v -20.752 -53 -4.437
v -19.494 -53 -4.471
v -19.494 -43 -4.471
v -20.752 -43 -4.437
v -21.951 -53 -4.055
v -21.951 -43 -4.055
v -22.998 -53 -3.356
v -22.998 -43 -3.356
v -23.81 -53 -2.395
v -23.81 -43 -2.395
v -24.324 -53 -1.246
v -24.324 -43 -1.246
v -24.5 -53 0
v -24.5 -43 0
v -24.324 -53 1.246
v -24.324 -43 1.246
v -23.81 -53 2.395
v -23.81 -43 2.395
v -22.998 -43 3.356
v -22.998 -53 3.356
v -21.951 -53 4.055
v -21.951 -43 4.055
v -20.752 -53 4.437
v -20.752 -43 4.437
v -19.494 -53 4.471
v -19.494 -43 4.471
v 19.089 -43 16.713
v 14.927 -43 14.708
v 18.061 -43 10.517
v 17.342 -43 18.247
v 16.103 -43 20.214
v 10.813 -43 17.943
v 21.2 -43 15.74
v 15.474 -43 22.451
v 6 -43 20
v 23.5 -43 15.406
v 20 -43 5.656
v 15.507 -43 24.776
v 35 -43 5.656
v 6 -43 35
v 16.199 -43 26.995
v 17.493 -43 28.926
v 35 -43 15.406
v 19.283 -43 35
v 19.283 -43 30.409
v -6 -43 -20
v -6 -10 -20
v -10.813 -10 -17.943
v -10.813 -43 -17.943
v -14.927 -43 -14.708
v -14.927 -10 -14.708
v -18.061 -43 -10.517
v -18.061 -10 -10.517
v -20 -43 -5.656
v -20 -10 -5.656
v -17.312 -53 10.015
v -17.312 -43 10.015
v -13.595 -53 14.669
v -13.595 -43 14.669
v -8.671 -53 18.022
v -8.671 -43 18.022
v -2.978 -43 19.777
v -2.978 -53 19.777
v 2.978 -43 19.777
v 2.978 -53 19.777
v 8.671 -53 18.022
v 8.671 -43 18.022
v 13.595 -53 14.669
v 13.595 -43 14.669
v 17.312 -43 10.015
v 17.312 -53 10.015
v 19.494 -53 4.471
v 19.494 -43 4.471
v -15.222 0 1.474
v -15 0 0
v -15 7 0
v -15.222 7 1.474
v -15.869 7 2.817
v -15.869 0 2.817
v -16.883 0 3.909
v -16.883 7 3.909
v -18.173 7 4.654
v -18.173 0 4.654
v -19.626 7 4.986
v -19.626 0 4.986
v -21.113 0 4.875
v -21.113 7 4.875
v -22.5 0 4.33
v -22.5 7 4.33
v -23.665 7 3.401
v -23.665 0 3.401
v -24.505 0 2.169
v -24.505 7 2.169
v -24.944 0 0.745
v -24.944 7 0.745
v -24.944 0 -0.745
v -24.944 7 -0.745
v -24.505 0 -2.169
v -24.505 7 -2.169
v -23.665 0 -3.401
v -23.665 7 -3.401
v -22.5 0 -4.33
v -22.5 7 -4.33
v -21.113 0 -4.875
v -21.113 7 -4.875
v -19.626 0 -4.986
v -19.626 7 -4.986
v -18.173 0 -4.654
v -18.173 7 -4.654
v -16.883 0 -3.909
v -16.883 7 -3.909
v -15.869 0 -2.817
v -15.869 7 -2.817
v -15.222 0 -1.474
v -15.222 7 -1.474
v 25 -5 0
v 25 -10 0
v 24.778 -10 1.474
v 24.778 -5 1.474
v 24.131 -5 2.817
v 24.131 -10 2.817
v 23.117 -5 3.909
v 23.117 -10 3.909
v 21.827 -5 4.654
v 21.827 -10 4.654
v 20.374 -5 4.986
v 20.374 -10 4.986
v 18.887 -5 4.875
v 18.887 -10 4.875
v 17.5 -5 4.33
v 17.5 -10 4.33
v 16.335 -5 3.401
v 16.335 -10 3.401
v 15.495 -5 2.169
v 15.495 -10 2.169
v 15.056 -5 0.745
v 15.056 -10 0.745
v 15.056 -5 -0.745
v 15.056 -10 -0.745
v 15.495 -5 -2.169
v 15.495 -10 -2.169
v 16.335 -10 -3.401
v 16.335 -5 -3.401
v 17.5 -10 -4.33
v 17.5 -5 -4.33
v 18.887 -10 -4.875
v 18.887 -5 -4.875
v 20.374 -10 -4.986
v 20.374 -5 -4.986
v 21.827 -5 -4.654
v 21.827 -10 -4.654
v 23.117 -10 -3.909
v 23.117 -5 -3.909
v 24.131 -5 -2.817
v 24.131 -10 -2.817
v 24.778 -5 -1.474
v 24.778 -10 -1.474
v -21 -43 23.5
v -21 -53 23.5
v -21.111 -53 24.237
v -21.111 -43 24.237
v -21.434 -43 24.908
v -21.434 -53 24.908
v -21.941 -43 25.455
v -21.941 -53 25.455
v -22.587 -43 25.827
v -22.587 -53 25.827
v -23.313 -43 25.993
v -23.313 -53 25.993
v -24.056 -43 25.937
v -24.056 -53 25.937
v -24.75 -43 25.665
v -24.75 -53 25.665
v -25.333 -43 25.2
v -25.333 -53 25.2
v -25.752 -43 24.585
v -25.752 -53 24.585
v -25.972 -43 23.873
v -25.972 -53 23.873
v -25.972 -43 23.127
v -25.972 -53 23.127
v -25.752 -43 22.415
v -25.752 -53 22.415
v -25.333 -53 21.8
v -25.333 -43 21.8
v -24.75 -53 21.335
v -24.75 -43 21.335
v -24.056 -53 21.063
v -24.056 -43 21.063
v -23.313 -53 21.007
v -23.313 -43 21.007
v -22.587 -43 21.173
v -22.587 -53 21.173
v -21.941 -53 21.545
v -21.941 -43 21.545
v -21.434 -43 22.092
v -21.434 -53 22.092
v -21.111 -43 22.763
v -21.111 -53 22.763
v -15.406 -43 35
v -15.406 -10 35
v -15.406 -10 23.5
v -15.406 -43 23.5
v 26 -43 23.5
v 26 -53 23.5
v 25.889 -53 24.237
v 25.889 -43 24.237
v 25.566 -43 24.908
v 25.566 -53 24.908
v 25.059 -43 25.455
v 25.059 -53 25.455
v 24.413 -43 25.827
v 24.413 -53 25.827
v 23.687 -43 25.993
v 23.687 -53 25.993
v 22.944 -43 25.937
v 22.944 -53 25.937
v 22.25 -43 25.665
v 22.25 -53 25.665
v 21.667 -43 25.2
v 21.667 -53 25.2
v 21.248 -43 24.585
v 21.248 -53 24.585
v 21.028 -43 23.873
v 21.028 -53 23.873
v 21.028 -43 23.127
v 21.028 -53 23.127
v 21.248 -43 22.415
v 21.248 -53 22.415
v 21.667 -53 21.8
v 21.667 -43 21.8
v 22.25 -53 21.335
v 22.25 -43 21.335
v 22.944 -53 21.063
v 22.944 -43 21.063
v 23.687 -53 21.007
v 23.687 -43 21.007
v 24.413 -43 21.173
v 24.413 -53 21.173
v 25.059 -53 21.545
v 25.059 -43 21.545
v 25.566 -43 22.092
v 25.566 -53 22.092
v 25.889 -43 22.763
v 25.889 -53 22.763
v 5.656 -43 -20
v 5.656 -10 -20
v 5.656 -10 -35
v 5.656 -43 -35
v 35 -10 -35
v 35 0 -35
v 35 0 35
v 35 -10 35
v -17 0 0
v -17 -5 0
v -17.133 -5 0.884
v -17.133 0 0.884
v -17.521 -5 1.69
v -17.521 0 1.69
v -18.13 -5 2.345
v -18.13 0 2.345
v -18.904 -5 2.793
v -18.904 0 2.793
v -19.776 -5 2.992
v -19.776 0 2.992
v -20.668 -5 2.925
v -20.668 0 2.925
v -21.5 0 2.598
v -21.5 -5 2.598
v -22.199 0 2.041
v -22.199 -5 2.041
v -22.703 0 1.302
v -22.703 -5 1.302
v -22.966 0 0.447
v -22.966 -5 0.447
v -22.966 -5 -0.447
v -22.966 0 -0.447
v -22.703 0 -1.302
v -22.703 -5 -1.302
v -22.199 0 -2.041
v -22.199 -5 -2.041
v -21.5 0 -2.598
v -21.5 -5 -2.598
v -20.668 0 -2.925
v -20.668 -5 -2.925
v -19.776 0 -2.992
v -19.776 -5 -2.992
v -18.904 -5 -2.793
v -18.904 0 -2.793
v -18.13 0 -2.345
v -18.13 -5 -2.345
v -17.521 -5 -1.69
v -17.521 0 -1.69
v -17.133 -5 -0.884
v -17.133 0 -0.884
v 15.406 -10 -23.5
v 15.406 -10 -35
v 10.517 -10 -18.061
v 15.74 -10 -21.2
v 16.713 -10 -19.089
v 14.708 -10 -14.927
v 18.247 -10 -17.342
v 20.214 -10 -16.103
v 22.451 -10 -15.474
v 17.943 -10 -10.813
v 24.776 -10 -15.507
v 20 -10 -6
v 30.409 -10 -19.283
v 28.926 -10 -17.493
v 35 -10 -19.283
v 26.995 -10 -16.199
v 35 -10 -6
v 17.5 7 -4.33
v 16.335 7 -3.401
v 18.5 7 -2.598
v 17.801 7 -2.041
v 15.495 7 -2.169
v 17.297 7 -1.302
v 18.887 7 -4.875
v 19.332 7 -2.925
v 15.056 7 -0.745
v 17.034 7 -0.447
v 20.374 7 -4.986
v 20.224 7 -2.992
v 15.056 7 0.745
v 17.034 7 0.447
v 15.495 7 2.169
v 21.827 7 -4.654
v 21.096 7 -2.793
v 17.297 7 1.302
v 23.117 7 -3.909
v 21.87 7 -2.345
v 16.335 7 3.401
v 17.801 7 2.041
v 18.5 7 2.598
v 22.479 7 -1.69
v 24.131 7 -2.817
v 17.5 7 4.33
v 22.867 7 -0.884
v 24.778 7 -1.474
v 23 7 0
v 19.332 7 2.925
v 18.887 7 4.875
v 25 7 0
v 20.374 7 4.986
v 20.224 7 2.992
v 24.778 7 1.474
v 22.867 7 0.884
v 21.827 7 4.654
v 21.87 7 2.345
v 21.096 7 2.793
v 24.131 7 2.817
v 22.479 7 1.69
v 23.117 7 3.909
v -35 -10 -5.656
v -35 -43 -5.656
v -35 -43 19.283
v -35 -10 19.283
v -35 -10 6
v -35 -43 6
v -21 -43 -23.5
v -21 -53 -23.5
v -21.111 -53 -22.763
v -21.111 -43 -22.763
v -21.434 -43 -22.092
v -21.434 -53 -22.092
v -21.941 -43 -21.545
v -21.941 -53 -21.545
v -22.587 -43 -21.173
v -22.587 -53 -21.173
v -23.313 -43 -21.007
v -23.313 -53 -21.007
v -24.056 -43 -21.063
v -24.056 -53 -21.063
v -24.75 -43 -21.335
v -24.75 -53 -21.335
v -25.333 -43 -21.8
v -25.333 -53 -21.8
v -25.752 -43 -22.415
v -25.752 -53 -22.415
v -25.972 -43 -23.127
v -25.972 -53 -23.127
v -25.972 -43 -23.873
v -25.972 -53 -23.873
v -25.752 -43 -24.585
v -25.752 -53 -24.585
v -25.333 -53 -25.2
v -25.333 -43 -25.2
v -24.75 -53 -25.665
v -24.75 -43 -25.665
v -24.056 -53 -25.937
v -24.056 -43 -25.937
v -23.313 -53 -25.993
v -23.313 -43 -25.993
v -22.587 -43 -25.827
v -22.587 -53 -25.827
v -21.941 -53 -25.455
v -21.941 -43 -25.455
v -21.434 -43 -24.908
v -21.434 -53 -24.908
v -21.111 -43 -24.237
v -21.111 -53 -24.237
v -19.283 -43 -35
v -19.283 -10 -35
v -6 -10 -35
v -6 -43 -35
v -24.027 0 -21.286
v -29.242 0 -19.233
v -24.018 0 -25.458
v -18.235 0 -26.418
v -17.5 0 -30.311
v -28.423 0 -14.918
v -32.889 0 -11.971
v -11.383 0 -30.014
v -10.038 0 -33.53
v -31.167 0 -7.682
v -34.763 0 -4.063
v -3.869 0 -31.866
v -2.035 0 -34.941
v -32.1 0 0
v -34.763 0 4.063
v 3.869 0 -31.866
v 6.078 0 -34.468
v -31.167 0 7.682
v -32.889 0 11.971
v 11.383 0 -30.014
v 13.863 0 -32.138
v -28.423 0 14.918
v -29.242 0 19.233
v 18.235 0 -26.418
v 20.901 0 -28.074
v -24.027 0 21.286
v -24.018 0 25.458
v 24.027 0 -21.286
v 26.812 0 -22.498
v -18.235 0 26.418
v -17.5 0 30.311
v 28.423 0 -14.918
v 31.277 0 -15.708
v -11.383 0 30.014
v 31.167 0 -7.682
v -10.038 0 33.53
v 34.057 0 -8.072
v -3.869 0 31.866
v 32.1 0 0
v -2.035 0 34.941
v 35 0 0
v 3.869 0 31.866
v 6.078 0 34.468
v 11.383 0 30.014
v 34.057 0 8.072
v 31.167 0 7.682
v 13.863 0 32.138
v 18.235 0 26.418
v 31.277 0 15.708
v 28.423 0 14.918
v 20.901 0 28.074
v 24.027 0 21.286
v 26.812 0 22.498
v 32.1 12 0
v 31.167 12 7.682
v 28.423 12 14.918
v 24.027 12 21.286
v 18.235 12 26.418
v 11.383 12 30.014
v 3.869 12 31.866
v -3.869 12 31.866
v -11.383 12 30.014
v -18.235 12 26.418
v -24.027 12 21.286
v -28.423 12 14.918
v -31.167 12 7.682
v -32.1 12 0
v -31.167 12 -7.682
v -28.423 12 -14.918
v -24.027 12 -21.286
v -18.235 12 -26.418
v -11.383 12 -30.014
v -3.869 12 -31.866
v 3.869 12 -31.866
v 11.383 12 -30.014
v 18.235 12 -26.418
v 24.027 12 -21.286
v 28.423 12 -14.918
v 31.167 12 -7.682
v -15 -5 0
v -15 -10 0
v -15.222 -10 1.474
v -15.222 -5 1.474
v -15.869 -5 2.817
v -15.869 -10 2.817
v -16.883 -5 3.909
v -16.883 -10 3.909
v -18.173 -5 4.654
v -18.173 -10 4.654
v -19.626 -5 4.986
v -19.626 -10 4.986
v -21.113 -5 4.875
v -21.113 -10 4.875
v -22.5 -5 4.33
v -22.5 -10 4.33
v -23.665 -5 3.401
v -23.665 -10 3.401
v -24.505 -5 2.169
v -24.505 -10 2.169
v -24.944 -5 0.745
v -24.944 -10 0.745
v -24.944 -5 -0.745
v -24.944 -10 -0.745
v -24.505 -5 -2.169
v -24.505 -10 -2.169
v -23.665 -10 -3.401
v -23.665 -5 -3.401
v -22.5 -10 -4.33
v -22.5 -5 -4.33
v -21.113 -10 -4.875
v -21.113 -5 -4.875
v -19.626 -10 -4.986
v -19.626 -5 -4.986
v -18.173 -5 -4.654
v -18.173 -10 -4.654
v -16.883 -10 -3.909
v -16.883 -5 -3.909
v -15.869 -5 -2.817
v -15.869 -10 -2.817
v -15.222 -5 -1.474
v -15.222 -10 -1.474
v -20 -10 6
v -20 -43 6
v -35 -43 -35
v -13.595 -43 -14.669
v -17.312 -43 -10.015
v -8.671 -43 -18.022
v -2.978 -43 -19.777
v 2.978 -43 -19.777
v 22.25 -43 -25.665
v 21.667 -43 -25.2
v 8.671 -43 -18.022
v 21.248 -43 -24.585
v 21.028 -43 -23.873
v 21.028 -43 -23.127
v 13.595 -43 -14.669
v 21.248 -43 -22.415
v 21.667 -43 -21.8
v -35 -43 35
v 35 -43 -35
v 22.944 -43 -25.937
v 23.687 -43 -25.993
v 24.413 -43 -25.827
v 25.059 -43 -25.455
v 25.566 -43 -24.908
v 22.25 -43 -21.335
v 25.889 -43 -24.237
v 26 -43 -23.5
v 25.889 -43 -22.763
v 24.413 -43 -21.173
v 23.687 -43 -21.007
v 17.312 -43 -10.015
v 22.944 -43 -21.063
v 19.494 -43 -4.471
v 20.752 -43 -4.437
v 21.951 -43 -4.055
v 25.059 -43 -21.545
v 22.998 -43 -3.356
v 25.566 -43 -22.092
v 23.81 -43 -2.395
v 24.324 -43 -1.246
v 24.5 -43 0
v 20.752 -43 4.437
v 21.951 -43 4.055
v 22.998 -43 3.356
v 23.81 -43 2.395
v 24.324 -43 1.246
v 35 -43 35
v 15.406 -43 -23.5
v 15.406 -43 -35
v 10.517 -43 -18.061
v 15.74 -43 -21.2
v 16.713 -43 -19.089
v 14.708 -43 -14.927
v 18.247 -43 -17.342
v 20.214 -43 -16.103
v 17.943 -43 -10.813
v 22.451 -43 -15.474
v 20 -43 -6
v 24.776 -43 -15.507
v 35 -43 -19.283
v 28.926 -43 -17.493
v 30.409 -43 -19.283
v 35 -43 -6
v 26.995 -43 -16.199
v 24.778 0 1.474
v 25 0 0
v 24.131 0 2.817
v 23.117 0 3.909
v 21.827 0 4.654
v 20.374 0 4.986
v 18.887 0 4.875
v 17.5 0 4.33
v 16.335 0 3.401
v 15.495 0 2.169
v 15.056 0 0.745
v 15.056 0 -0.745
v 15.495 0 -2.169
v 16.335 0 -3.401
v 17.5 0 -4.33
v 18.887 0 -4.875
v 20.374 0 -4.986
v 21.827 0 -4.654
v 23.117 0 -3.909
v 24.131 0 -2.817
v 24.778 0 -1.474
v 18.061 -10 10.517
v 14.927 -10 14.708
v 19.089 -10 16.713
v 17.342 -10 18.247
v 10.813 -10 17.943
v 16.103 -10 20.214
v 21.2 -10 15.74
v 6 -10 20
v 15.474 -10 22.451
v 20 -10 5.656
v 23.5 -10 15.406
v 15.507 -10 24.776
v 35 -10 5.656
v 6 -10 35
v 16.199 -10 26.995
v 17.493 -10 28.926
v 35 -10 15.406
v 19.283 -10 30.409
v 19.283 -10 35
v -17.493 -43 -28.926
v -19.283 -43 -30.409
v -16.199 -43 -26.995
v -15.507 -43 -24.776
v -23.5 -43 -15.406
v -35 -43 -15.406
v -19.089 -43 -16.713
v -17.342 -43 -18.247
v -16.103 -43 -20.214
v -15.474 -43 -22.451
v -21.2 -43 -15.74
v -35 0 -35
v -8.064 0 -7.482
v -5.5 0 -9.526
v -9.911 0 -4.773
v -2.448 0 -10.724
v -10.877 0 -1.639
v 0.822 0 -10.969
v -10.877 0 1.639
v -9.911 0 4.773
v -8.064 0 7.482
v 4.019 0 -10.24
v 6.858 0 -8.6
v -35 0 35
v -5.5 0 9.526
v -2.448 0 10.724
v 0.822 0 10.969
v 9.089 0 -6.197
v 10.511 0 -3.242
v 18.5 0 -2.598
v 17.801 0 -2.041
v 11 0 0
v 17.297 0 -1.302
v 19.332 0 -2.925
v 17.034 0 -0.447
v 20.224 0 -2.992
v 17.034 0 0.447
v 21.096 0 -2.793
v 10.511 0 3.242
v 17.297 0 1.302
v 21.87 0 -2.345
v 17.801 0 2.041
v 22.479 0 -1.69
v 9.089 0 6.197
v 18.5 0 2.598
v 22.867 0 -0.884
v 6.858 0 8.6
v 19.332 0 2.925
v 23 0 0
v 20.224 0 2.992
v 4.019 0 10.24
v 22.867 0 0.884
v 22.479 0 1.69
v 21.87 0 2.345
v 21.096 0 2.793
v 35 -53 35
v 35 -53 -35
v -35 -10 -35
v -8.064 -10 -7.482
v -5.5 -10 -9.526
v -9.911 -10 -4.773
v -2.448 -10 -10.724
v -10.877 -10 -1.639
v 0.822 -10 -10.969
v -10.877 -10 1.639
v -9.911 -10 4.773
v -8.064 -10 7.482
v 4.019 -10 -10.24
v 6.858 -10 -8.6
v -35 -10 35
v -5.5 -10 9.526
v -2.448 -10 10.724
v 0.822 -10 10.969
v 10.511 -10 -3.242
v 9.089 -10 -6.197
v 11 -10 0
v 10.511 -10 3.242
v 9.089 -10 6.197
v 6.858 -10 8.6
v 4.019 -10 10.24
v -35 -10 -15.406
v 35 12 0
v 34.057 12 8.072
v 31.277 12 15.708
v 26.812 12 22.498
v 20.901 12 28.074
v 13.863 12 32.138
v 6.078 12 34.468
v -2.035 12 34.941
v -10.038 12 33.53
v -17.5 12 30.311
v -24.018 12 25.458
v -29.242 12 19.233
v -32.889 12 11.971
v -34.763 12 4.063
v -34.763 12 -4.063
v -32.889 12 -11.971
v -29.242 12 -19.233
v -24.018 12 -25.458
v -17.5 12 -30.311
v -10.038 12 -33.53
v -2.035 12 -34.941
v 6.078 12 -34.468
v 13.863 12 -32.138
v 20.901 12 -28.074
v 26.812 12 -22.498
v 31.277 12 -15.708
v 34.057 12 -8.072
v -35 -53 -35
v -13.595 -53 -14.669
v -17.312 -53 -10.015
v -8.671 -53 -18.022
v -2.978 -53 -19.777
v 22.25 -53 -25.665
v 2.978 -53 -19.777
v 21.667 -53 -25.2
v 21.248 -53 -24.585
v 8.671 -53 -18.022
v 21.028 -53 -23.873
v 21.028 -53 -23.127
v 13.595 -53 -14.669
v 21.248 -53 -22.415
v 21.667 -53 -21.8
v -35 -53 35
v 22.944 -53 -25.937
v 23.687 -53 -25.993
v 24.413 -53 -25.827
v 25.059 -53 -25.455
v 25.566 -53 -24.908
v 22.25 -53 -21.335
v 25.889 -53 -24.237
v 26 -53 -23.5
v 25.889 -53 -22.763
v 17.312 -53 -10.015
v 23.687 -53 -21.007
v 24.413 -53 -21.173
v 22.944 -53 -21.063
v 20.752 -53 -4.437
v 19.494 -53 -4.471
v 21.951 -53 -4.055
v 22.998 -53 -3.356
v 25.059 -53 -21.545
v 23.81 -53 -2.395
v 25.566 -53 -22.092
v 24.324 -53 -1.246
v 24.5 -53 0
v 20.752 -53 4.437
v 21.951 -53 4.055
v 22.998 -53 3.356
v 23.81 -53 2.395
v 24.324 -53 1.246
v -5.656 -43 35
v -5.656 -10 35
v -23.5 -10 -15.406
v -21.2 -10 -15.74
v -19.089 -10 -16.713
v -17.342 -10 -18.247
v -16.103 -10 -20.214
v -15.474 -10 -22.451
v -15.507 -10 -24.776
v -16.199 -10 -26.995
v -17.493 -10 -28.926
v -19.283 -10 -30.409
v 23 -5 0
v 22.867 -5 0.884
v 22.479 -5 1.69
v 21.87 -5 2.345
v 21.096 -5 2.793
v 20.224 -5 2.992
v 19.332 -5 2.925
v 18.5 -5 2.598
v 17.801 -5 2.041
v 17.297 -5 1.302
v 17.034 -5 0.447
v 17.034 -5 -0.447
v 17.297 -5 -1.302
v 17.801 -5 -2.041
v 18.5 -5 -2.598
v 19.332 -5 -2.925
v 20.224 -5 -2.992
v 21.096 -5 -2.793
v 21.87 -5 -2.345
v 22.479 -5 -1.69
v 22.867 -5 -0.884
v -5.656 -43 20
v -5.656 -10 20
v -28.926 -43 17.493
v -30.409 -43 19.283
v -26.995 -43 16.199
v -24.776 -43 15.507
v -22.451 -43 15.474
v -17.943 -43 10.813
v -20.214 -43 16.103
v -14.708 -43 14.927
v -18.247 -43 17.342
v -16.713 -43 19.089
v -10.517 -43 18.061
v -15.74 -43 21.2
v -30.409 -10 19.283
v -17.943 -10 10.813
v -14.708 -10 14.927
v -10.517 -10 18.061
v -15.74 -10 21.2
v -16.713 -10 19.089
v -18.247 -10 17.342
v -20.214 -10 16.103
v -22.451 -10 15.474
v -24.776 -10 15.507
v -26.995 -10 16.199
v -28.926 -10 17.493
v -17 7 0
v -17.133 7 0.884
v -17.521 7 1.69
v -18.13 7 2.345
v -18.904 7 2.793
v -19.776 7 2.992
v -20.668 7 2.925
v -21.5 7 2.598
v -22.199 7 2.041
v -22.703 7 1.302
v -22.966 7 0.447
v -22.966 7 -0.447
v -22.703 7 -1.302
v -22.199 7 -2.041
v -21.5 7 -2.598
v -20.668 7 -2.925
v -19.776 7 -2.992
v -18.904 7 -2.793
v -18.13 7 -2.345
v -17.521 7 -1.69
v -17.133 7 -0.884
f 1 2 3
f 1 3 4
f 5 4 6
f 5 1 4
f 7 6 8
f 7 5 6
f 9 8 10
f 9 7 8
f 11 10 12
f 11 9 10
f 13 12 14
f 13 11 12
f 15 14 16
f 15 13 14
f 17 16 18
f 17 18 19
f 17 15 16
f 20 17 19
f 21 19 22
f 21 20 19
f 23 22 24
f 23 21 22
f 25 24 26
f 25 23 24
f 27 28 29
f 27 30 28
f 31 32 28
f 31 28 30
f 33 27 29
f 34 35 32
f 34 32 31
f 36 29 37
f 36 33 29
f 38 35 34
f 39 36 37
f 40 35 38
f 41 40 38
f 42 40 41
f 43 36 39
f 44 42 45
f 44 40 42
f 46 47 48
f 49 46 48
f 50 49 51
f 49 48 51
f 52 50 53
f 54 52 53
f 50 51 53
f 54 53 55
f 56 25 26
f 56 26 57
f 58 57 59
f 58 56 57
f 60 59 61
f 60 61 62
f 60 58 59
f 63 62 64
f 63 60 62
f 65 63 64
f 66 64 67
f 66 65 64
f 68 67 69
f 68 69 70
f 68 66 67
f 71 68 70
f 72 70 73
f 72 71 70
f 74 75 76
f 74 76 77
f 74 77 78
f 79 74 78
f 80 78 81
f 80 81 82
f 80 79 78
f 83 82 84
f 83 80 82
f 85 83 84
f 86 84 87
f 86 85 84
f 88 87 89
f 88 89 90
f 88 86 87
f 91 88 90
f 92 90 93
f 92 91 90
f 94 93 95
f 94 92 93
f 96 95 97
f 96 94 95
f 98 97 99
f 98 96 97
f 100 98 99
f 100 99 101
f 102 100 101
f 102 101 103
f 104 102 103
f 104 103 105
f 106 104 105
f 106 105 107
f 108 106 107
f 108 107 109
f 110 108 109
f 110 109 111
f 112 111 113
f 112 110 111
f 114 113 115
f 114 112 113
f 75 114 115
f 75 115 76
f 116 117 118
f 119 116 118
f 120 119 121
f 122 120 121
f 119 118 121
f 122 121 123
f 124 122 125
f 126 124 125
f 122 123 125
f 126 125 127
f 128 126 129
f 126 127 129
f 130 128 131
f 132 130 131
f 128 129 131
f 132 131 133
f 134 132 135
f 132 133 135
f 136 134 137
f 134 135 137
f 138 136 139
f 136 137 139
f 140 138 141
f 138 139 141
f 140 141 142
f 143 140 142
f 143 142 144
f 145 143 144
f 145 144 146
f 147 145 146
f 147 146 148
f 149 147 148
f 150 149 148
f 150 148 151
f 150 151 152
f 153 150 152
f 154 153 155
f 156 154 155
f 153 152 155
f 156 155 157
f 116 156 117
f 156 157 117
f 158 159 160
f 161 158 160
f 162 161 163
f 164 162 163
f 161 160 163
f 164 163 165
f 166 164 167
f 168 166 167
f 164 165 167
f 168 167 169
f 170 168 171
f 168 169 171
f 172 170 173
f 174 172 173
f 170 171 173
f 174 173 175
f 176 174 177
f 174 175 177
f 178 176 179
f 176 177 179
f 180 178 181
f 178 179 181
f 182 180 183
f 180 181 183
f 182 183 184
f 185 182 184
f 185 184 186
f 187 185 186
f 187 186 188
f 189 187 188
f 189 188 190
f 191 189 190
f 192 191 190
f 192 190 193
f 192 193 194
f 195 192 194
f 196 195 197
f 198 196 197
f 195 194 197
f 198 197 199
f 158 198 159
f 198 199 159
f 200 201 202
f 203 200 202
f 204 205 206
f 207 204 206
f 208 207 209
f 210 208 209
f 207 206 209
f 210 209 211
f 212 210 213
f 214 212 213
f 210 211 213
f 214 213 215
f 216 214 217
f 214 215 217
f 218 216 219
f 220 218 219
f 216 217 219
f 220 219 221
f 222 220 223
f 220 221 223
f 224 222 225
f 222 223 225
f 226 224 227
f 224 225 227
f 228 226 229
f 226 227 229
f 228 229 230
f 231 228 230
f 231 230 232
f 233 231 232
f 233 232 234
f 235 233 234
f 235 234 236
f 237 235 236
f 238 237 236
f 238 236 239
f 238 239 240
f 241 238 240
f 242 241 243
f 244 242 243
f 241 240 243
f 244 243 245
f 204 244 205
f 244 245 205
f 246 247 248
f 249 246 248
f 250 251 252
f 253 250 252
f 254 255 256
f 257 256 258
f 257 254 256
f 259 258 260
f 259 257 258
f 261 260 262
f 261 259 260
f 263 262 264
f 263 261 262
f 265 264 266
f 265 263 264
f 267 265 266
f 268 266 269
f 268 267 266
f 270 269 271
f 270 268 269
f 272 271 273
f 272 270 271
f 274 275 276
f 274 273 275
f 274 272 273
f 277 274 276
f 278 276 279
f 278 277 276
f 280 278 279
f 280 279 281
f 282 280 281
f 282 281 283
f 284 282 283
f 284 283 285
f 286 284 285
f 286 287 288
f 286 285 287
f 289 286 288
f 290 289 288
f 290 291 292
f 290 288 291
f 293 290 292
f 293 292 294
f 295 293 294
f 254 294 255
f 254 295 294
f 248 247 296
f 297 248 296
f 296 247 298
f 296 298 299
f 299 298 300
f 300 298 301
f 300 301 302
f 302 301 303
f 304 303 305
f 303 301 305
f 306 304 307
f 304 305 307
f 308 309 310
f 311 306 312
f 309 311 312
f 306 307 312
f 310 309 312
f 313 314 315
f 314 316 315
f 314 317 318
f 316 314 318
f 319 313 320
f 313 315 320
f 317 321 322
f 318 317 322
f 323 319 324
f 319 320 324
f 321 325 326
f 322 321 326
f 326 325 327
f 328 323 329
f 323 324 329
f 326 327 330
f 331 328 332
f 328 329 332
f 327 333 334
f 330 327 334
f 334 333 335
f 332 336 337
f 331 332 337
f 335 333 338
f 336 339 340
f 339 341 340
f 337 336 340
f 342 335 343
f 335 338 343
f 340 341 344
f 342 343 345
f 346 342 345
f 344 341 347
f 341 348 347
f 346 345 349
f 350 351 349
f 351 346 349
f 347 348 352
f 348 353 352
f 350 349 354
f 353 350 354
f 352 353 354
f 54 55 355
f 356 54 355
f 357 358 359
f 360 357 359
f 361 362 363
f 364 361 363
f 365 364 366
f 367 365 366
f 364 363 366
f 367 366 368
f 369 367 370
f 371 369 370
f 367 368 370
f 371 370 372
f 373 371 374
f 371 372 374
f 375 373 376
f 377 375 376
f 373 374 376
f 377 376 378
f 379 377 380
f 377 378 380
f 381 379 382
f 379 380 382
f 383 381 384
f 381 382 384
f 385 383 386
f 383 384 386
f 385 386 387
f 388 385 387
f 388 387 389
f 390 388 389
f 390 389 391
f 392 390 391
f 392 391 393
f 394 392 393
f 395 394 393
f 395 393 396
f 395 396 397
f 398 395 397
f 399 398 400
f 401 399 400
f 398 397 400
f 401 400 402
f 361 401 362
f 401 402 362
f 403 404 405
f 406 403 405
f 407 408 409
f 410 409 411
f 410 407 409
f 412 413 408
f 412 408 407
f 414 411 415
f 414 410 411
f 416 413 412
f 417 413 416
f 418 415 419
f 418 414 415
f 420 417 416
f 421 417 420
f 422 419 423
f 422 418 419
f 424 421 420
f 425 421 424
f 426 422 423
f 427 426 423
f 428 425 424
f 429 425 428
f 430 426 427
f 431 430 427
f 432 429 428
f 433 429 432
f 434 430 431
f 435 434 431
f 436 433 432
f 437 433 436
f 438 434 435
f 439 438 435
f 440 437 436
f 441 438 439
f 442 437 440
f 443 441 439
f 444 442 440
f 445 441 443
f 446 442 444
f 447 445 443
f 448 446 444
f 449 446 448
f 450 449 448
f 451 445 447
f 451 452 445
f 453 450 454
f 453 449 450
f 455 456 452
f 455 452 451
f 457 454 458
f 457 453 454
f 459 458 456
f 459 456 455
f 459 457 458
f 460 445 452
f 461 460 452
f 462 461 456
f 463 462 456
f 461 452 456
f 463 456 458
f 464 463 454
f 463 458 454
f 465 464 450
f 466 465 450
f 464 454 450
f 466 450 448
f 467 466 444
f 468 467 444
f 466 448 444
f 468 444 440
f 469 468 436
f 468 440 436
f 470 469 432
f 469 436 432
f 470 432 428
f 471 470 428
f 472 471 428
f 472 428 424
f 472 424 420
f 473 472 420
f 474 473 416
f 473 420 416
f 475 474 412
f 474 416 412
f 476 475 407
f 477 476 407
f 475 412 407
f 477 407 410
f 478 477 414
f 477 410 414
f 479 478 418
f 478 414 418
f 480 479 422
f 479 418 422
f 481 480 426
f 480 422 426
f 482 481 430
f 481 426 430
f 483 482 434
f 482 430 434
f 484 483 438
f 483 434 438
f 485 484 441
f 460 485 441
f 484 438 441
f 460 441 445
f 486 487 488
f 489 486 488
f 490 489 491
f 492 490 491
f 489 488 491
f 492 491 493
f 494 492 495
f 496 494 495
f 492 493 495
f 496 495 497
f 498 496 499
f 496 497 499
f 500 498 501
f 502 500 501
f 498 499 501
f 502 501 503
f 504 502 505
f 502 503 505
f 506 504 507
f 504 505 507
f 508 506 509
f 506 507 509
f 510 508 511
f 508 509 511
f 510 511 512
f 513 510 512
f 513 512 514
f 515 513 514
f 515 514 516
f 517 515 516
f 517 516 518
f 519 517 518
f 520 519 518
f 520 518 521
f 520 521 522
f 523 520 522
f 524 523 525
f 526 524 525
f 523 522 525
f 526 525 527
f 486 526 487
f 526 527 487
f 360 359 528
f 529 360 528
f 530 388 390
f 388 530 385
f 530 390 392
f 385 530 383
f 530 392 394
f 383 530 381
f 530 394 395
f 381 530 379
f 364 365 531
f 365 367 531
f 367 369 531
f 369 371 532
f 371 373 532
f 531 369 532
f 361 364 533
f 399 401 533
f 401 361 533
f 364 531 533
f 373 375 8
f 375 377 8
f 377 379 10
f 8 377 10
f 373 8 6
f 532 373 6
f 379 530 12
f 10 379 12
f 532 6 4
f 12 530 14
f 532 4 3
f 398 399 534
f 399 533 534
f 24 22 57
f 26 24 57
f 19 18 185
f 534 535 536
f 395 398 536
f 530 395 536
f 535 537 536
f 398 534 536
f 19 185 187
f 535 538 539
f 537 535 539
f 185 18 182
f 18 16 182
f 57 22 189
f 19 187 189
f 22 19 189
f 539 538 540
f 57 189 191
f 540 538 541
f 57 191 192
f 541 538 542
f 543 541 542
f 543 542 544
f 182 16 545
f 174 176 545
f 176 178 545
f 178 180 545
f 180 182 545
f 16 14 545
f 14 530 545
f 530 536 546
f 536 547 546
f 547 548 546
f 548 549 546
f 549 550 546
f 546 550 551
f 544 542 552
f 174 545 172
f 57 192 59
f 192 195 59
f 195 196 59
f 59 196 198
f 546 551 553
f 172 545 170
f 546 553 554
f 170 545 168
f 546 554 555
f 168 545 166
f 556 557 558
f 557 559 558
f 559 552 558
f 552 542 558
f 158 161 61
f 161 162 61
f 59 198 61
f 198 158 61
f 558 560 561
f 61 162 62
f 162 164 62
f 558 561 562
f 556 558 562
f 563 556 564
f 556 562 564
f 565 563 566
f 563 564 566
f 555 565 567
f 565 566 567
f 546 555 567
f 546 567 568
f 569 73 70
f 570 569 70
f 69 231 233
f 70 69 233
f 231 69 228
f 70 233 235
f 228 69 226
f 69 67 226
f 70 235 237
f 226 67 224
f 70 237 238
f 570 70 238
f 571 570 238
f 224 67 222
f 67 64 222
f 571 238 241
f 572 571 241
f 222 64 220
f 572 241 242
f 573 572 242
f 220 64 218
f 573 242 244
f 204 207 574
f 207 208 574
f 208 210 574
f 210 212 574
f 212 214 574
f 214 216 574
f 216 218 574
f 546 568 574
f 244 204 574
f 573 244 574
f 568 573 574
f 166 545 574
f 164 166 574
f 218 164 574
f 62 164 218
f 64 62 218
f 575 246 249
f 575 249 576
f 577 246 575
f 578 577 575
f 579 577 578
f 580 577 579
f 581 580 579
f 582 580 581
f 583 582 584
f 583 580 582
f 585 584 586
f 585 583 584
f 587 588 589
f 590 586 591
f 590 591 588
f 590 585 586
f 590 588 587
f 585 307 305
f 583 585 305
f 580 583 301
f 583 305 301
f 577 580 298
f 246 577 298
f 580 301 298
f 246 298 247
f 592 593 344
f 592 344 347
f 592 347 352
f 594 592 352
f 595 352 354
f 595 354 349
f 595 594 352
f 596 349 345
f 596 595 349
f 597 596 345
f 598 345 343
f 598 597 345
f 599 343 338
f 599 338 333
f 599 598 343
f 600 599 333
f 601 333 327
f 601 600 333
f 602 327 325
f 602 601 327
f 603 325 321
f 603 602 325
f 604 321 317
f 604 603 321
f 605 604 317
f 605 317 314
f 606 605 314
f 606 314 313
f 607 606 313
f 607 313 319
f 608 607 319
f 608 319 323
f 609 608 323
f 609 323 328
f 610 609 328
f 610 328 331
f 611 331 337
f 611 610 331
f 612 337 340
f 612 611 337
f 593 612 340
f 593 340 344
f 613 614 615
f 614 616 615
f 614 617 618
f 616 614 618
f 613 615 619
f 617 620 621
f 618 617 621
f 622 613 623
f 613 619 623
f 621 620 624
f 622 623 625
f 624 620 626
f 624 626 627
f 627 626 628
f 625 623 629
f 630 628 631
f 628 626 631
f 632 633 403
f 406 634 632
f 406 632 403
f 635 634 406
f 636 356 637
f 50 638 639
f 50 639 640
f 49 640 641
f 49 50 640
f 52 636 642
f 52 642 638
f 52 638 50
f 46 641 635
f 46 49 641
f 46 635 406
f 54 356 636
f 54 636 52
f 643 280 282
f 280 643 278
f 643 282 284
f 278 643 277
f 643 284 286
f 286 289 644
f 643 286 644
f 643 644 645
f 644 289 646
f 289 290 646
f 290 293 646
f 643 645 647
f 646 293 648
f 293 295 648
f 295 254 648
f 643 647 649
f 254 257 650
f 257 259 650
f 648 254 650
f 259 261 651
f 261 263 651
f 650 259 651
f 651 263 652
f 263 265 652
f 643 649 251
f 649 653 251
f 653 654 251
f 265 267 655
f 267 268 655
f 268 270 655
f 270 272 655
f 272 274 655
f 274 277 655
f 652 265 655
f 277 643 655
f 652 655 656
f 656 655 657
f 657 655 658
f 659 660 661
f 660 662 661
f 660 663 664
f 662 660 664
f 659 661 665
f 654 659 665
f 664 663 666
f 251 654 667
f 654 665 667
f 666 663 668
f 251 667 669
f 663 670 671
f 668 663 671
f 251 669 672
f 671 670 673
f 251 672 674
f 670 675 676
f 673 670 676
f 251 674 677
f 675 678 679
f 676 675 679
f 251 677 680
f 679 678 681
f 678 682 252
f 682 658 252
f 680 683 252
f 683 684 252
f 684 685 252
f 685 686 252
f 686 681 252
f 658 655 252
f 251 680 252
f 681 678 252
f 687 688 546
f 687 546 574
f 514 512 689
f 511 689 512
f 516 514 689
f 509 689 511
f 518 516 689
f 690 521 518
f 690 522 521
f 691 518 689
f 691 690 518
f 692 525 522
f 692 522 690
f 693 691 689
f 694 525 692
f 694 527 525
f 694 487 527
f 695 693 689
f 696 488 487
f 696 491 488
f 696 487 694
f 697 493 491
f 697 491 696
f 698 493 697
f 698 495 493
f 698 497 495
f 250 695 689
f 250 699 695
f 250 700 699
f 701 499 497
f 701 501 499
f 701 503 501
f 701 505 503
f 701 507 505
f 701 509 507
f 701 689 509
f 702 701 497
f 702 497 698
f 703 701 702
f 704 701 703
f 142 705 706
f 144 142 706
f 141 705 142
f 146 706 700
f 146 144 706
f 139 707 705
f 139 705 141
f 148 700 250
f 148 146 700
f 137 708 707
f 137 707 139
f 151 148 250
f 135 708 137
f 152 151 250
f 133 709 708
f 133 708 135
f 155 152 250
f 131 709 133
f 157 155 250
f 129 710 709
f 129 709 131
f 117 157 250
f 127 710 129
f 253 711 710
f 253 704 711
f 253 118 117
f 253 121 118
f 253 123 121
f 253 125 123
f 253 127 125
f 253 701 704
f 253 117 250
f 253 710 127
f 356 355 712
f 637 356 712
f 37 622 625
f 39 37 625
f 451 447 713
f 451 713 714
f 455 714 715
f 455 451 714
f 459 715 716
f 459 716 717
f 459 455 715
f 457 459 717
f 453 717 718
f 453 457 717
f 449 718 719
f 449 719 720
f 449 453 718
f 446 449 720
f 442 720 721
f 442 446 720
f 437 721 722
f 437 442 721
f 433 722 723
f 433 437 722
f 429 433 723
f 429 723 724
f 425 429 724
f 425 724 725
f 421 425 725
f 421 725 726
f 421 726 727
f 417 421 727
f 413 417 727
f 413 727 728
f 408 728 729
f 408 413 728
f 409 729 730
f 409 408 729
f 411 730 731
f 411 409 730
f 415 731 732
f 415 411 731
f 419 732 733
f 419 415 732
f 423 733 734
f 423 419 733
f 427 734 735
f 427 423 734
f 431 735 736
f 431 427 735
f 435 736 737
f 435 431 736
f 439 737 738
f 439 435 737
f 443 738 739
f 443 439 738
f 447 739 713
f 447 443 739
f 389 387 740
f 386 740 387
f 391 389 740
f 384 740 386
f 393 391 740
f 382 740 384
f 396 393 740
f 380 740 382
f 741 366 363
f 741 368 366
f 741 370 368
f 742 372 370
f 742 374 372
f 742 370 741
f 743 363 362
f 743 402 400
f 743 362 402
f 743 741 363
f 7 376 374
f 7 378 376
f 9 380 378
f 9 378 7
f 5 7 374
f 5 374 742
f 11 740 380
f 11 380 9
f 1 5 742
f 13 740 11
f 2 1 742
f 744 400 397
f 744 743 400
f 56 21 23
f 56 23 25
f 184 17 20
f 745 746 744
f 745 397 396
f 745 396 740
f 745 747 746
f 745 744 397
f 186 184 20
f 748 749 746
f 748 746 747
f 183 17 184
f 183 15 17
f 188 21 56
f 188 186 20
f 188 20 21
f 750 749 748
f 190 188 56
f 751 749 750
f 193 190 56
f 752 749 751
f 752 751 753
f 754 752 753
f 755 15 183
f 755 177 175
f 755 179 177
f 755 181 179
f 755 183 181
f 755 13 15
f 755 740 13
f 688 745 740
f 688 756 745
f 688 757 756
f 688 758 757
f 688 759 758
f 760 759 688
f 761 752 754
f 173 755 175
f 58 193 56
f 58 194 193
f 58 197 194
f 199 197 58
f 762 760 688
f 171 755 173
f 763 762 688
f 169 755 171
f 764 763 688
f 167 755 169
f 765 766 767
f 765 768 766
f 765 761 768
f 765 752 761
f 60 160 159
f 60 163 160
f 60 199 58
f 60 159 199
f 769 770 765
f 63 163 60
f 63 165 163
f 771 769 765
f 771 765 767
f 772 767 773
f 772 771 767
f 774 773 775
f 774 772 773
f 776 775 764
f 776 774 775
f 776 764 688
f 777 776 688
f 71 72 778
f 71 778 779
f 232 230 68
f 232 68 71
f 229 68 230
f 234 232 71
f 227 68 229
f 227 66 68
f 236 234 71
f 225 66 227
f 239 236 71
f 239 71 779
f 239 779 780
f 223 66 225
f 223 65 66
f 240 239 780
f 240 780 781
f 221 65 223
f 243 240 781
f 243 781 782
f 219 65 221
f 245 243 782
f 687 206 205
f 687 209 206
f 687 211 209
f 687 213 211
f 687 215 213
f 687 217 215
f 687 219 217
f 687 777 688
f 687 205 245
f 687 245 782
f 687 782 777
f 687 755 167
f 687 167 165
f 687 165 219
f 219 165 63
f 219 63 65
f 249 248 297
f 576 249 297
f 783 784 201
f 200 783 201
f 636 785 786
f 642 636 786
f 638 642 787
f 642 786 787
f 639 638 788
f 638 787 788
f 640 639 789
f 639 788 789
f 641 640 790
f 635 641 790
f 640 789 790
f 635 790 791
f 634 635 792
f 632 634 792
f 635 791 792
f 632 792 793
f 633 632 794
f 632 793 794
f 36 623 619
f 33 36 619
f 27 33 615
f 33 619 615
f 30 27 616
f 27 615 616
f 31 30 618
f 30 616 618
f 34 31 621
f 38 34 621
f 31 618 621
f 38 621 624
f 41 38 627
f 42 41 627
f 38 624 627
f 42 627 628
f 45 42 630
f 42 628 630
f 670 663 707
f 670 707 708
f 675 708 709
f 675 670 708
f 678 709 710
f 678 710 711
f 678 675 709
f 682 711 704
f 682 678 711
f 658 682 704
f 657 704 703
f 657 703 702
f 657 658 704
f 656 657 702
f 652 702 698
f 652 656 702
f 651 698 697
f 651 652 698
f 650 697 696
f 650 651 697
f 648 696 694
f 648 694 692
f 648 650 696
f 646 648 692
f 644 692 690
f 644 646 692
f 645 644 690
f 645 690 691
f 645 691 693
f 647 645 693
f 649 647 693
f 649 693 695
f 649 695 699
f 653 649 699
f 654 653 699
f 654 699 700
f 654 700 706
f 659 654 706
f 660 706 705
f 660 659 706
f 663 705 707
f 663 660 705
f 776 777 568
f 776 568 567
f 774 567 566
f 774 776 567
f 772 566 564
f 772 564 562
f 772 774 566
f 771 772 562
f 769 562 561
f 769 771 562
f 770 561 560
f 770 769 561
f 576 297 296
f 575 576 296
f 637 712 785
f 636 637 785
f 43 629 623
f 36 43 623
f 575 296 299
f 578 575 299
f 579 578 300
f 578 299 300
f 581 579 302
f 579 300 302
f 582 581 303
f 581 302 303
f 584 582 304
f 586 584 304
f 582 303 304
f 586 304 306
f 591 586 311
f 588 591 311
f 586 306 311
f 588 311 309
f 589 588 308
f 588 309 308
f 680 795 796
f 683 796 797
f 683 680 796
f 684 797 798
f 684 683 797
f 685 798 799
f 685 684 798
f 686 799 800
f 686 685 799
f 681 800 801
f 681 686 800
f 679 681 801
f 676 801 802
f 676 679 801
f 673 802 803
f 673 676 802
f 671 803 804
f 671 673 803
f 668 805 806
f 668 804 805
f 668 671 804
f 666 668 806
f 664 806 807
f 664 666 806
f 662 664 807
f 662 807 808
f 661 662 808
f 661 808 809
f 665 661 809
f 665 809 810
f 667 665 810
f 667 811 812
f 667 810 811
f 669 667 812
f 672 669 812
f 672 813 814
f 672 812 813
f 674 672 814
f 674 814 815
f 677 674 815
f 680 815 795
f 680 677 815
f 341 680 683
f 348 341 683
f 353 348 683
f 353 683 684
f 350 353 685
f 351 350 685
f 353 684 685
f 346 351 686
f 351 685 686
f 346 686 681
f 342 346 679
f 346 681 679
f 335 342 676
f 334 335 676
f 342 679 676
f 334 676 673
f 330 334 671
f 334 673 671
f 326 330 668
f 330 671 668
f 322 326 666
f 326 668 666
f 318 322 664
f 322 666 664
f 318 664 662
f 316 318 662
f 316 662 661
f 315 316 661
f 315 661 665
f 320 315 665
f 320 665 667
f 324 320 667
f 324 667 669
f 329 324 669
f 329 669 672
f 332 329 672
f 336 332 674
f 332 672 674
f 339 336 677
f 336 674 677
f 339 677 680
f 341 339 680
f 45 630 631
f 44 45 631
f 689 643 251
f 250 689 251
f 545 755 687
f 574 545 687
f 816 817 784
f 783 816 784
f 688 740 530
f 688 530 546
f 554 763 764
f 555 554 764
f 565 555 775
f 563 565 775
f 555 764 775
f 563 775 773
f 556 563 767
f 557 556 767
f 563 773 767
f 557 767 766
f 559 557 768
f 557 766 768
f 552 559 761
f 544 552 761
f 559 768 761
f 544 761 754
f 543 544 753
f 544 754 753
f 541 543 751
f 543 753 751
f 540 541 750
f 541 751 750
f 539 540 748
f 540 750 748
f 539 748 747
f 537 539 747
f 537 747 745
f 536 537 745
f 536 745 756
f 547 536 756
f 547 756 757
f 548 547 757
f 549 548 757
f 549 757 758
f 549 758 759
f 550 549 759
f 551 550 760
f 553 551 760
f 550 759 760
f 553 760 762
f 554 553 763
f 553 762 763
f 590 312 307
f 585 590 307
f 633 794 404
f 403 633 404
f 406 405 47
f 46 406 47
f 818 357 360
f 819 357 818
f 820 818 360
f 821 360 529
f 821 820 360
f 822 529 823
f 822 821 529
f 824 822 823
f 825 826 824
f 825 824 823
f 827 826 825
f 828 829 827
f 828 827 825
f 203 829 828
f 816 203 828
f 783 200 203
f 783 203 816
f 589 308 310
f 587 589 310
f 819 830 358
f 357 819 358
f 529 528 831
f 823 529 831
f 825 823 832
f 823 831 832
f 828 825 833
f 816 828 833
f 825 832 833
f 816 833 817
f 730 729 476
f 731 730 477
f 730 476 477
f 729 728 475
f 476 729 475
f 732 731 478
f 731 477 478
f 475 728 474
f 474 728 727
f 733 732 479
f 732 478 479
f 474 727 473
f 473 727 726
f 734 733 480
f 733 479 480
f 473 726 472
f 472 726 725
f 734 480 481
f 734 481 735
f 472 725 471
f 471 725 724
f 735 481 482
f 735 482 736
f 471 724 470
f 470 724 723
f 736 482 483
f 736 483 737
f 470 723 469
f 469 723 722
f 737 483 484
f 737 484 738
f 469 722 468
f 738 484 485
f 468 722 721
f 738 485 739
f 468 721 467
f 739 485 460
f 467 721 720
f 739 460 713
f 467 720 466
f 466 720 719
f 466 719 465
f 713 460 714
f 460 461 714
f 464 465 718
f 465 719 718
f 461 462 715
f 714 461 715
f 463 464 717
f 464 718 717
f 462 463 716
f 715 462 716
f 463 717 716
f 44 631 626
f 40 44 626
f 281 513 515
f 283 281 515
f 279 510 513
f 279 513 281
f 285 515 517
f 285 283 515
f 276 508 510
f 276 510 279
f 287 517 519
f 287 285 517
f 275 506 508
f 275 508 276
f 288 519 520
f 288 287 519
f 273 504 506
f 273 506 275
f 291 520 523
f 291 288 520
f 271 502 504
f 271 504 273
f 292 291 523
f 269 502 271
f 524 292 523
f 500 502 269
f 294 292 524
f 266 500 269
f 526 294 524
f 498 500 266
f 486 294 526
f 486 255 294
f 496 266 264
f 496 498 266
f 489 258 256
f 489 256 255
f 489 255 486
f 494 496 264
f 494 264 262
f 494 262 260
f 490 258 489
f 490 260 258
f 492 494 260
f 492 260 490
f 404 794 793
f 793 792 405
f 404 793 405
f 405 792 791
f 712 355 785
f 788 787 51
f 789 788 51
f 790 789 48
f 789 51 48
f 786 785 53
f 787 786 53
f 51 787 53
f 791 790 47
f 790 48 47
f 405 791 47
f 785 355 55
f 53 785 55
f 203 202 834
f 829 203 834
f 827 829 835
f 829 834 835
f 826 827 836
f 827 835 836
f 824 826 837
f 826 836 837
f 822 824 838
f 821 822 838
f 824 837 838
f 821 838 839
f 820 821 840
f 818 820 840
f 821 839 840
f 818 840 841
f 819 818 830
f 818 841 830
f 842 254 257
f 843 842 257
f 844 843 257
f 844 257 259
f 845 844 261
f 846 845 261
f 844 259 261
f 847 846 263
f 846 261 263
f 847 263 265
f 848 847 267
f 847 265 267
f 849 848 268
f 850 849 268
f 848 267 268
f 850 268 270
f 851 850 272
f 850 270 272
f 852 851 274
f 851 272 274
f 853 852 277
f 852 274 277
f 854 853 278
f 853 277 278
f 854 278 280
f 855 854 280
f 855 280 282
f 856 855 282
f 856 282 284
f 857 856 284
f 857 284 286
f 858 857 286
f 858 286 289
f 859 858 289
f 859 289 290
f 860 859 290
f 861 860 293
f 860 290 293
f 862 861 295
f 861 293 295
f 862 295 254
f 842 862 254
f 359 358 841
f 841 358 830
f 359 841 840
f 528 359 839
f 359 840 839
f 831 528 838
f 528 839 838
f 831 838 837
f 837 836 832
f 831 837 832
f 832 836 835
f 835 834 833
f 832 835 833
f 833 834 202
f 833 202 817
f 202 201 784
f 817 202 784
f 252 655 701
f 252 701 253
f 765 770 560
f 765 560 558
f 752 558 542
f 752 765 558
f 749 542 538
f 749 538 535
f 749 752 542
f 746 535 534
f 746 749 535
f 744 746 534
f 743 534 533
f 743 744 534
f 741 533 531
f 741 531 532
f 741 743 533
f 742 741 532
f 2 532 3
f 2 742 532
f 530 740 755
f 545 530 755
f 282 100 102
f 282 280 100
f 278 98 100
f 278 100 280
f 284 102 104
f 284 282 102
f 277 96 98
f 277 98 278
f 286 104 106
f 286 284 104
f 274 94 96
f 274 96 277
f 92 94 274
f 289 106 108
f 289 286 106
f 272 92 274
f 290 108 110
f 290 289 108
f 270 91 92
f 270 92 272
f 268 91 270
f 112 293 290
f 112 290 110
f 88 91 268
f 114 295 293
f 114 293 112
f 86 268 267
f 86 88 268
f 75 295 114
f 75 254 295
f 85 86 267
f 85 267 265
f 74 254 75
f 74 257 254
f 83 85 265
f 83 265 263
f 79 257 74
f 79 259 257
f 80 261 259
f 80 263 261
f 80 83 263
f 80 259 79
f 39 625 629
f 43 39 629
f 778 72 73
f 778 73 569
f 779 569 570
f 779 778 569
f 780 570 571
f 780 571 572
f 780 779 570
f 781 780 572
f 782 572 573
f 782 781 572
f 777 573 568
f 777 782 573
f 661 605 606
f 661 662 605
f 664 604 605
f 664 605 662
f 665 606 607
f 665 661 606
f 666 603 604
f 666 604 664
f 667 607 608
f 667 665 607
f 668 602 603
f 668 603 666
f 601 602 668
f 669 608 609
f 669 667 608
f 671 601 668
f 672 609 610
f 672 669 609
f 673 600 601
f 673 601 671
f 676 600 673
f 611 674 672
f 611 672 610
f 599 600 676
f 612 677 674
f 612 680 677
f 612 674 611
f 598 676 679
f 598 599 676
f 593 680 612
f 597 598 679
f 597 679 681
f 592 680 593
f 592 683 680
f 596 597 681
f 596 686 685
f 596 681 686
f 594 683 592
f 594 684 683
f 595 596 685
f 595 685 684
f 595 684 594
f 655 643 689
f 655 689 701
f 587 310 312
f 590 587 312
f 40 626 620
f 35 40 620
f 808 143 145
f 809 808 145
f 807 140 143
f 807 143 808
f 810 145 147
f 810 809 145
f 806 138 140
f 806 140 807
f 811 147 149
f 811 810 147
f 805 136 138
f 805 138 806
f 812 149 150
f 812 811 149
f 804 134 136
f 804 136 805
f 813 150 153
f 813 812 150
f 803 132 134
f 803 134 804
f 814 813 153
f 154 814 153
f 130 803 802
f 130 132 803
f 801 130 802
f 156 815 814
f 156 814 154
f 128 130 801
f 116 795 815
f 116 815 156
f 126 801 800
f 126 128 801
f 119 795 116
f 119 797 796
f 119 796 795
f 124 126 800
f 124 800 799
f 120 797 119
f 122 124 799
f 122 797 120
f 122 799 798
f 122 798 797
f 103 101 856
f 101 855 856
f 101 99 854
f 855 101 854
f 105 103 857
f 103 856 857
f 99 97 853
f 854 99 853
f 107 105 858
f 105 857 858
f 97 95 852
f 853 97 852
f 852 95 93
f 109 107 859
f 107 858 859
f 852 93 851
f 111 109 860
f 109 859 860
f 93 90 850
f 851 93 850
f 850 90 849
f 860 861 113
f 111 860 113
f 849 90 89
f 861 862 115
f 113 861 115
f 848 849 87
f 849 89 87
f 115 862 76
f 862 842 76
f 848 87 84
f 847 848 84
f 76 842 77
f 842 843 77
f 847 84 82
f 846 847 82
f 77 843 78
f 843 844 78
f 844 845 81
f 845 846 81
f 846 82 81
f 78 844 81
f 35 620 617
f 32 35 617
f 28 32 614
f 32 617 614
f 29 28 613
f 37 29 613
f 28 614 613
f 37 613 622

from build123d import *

# Parameters (mm, degrees)
F0_R      = 5
F0_R_2    = 3
F1_DEPTH  = 7
F2_R      = 35
F2_R_2    = 32.1
F3_DEPTH  = 12
F4_W      = 70
F4_H      = 70
F4_R      = 3
F4_R_2    = 11
F5_DEPTH  = 10
F7_R      = 5
F8_DEPTH  = 5
F10_W     = 70
F10_H     = 70
F10_R     = 2.5
F11_DEPTH = 10
F13_DEPTH = 33


with BuildPart() as f1:
    # F0 (on Front) → F1 (new body)
    with BuildSketch(Plane.XZ):
        with Locations((-20, 0)):
            Circle(F0_R)
        with Locations((-20, 0)):
            Circle(F0_R_2, mode=Mode.SUBTRACT)
        with Locations((20, 0)):
            Circle(F0_R)
        with Locations((20, 0)):
            Circle(F0_R_2, mode=Mode.SUBTRACT)
    extrude(amount=-F1_DEPTH)


with BuildPart() as f3:
    # F2 (on Front) → F3 (new body)
    with BuildSketch(Plane.XZ):
        Circle(F2_R)
        Circle(F2_R_2, mode=Mode.SUBTRACT)
    extrude(amount=-F3_DEPTH)


with BuildPart() as f5:
    # F4 (on Front) → F5 (new body)
    with BuildSketch(Plane.XZ):
        Rectangle(F4_W, F4_H)
        with Locations((-20, 0)):
            Circle(F4_R, mode=Mode.SUBTRACT)
        Circle(F4_R_2, mode=Mode.SUBTRACT)
        with Locations((20, 0)):
            Circle(F4_R, mode=Mode.SUBTRACT)
    extrude(amount=F5_DEPTH)

    # F7 (on offset) → F8 (cut)
    with BuildSketch(Plane.XZ.offset(10)):
        with Locations((-20, 0)):
            Circle(F7_R)
        with Locations((20, 0)):
            Circle(F7_R)
    extrude(amount=-F8_DEPTH, mode=Mode.SUBTRACT)


with BuildPart() as f11:
    # F10 (on offset) → F11 (new body)
    with BuildSketch(Plane.XZ.offset(53)):
        Rectangle(F10_W, F10_H)
        with Locations((-23.5, -23.5)):
            Circle(F10_R, mode=Mode.SUBTRACT)
        with Locations((23.5, -23.5)):
            Circle(F10_R, mode=Mode.SUBTRACT)
        with Locations((-23.5, 23.5)):
            Circle(F10_R, mode=Mode.SUBTRACT)
        with BuildLine():
            ThreePointArc((-19.49375, 4.471433), (0, 20), (19.49375, 4.471433))
            ThreePointArc((19.49375, 4.471433), (22.997655, 3.356198), (24.5, 0))
            ThreePointArc((24.5, 0), (22.997655, -3.356198), (19.49375, -4.471433))
            ThreePointArc((19.49375, -4.471433), (0, -20), (-19.49375, -4.471433))
            ThreePointArc((-19.49375, -4.471433), (-24.5, 0), (-19.49375, 4.471433))
        make_face(mode=Mode.SUBTRACT)
        with Locations((23.5, 23.5)):
            Circle(F10_R, mode=Mode.SUBTRACT)
    extrude(amount=-F11_DEPTH)


with BuildPart() as f13:
    # F12 (on offset) → F13 (new body)
    with BuildSketch(Plane.XZ.offset(10)):
        with BuildLine():
            Line((-35, 19.283103), (-35, 6))
            Line((-35, 6), (-20, 6))
            ThreePointArc((-20, 6), (-14.708285, 14.926632), (-5.655774, 20))
            Line((-5.655774, 20), (-5.655774, 35))
            Line((-5.655774, 35), (-15.405774, 35))
            Line((-15.405774, 35), (-15.405774, 23.5))
            ThreePointArc((-15.405774, 23.5), (-21.309853, 15.707712), (-30.409, 19.283103))
            Line((-30.409, 19.283103), (-35, 19.283103))
        make_face()
        with BuildLine():
            Line((-20, -5.655774), (-35, -5.655774))
            Line((-35, -5.655774), (-35, -15.405774))
            Line((-35, -15.405774), (-23.5, -15.405774))
            ThreePointArc((-23.5, -15.405774), (-15.707712, -21.309853), (-19.283103, -30.409))
            Line((-19.283103, -30.409), (-19.283103, -35))
            Line((-19.283103, -35), (-6, -35))
            Line((-6, -35), (-6, -20))
            ThreePointArc((-6, -20), (-14.926632, -14.708285), (-20, -5.655774))
        make_face()
        with BuildLine():
            Line((5.655774, -20), (5.655774, -35))
            Line((5.655774, -35), (15.405774, -35))
            Line((15.405774, -35), (15.405774, -23.5))
            ThreePointArc((15.405774, -23.5), (21.309853, -15.707712), (30.409, -19.283103))
            Line((30.409, -19.283103), (35, -19.283103))
            Line((35, -19.283103), (35, -6))
            Line((35, -6), (20, -6))
            ThreePointArc((20, -6), (14.708285, -14.926632), (5.655774, -20))
        make_face()
        with BuildLine():
            Line((20, 5.655774), (35, 5.655774))
            Line((35, 5.655774), (35, 15.405774))
            Line((35, 15.405774), (23.5, 15.405774))
            ThreePointArc((23.5, 15.405774), (15.707712, 21.309853), (19.283103, 30.409))
            Line((19.283103, 30.409), (19.283103, 35))
            Line((19.283103, 35), (6, 35))
            Line((6, 35), (6, 20))
            ThreePointArc((6, 20), (14.926632, 14.708285), (20, 5.655774))
        make_face()
    extrude(amount=F13_DEPTH)


solid = Compound([f1.part, f3.part, f5.part, f11.part, f13.part])
